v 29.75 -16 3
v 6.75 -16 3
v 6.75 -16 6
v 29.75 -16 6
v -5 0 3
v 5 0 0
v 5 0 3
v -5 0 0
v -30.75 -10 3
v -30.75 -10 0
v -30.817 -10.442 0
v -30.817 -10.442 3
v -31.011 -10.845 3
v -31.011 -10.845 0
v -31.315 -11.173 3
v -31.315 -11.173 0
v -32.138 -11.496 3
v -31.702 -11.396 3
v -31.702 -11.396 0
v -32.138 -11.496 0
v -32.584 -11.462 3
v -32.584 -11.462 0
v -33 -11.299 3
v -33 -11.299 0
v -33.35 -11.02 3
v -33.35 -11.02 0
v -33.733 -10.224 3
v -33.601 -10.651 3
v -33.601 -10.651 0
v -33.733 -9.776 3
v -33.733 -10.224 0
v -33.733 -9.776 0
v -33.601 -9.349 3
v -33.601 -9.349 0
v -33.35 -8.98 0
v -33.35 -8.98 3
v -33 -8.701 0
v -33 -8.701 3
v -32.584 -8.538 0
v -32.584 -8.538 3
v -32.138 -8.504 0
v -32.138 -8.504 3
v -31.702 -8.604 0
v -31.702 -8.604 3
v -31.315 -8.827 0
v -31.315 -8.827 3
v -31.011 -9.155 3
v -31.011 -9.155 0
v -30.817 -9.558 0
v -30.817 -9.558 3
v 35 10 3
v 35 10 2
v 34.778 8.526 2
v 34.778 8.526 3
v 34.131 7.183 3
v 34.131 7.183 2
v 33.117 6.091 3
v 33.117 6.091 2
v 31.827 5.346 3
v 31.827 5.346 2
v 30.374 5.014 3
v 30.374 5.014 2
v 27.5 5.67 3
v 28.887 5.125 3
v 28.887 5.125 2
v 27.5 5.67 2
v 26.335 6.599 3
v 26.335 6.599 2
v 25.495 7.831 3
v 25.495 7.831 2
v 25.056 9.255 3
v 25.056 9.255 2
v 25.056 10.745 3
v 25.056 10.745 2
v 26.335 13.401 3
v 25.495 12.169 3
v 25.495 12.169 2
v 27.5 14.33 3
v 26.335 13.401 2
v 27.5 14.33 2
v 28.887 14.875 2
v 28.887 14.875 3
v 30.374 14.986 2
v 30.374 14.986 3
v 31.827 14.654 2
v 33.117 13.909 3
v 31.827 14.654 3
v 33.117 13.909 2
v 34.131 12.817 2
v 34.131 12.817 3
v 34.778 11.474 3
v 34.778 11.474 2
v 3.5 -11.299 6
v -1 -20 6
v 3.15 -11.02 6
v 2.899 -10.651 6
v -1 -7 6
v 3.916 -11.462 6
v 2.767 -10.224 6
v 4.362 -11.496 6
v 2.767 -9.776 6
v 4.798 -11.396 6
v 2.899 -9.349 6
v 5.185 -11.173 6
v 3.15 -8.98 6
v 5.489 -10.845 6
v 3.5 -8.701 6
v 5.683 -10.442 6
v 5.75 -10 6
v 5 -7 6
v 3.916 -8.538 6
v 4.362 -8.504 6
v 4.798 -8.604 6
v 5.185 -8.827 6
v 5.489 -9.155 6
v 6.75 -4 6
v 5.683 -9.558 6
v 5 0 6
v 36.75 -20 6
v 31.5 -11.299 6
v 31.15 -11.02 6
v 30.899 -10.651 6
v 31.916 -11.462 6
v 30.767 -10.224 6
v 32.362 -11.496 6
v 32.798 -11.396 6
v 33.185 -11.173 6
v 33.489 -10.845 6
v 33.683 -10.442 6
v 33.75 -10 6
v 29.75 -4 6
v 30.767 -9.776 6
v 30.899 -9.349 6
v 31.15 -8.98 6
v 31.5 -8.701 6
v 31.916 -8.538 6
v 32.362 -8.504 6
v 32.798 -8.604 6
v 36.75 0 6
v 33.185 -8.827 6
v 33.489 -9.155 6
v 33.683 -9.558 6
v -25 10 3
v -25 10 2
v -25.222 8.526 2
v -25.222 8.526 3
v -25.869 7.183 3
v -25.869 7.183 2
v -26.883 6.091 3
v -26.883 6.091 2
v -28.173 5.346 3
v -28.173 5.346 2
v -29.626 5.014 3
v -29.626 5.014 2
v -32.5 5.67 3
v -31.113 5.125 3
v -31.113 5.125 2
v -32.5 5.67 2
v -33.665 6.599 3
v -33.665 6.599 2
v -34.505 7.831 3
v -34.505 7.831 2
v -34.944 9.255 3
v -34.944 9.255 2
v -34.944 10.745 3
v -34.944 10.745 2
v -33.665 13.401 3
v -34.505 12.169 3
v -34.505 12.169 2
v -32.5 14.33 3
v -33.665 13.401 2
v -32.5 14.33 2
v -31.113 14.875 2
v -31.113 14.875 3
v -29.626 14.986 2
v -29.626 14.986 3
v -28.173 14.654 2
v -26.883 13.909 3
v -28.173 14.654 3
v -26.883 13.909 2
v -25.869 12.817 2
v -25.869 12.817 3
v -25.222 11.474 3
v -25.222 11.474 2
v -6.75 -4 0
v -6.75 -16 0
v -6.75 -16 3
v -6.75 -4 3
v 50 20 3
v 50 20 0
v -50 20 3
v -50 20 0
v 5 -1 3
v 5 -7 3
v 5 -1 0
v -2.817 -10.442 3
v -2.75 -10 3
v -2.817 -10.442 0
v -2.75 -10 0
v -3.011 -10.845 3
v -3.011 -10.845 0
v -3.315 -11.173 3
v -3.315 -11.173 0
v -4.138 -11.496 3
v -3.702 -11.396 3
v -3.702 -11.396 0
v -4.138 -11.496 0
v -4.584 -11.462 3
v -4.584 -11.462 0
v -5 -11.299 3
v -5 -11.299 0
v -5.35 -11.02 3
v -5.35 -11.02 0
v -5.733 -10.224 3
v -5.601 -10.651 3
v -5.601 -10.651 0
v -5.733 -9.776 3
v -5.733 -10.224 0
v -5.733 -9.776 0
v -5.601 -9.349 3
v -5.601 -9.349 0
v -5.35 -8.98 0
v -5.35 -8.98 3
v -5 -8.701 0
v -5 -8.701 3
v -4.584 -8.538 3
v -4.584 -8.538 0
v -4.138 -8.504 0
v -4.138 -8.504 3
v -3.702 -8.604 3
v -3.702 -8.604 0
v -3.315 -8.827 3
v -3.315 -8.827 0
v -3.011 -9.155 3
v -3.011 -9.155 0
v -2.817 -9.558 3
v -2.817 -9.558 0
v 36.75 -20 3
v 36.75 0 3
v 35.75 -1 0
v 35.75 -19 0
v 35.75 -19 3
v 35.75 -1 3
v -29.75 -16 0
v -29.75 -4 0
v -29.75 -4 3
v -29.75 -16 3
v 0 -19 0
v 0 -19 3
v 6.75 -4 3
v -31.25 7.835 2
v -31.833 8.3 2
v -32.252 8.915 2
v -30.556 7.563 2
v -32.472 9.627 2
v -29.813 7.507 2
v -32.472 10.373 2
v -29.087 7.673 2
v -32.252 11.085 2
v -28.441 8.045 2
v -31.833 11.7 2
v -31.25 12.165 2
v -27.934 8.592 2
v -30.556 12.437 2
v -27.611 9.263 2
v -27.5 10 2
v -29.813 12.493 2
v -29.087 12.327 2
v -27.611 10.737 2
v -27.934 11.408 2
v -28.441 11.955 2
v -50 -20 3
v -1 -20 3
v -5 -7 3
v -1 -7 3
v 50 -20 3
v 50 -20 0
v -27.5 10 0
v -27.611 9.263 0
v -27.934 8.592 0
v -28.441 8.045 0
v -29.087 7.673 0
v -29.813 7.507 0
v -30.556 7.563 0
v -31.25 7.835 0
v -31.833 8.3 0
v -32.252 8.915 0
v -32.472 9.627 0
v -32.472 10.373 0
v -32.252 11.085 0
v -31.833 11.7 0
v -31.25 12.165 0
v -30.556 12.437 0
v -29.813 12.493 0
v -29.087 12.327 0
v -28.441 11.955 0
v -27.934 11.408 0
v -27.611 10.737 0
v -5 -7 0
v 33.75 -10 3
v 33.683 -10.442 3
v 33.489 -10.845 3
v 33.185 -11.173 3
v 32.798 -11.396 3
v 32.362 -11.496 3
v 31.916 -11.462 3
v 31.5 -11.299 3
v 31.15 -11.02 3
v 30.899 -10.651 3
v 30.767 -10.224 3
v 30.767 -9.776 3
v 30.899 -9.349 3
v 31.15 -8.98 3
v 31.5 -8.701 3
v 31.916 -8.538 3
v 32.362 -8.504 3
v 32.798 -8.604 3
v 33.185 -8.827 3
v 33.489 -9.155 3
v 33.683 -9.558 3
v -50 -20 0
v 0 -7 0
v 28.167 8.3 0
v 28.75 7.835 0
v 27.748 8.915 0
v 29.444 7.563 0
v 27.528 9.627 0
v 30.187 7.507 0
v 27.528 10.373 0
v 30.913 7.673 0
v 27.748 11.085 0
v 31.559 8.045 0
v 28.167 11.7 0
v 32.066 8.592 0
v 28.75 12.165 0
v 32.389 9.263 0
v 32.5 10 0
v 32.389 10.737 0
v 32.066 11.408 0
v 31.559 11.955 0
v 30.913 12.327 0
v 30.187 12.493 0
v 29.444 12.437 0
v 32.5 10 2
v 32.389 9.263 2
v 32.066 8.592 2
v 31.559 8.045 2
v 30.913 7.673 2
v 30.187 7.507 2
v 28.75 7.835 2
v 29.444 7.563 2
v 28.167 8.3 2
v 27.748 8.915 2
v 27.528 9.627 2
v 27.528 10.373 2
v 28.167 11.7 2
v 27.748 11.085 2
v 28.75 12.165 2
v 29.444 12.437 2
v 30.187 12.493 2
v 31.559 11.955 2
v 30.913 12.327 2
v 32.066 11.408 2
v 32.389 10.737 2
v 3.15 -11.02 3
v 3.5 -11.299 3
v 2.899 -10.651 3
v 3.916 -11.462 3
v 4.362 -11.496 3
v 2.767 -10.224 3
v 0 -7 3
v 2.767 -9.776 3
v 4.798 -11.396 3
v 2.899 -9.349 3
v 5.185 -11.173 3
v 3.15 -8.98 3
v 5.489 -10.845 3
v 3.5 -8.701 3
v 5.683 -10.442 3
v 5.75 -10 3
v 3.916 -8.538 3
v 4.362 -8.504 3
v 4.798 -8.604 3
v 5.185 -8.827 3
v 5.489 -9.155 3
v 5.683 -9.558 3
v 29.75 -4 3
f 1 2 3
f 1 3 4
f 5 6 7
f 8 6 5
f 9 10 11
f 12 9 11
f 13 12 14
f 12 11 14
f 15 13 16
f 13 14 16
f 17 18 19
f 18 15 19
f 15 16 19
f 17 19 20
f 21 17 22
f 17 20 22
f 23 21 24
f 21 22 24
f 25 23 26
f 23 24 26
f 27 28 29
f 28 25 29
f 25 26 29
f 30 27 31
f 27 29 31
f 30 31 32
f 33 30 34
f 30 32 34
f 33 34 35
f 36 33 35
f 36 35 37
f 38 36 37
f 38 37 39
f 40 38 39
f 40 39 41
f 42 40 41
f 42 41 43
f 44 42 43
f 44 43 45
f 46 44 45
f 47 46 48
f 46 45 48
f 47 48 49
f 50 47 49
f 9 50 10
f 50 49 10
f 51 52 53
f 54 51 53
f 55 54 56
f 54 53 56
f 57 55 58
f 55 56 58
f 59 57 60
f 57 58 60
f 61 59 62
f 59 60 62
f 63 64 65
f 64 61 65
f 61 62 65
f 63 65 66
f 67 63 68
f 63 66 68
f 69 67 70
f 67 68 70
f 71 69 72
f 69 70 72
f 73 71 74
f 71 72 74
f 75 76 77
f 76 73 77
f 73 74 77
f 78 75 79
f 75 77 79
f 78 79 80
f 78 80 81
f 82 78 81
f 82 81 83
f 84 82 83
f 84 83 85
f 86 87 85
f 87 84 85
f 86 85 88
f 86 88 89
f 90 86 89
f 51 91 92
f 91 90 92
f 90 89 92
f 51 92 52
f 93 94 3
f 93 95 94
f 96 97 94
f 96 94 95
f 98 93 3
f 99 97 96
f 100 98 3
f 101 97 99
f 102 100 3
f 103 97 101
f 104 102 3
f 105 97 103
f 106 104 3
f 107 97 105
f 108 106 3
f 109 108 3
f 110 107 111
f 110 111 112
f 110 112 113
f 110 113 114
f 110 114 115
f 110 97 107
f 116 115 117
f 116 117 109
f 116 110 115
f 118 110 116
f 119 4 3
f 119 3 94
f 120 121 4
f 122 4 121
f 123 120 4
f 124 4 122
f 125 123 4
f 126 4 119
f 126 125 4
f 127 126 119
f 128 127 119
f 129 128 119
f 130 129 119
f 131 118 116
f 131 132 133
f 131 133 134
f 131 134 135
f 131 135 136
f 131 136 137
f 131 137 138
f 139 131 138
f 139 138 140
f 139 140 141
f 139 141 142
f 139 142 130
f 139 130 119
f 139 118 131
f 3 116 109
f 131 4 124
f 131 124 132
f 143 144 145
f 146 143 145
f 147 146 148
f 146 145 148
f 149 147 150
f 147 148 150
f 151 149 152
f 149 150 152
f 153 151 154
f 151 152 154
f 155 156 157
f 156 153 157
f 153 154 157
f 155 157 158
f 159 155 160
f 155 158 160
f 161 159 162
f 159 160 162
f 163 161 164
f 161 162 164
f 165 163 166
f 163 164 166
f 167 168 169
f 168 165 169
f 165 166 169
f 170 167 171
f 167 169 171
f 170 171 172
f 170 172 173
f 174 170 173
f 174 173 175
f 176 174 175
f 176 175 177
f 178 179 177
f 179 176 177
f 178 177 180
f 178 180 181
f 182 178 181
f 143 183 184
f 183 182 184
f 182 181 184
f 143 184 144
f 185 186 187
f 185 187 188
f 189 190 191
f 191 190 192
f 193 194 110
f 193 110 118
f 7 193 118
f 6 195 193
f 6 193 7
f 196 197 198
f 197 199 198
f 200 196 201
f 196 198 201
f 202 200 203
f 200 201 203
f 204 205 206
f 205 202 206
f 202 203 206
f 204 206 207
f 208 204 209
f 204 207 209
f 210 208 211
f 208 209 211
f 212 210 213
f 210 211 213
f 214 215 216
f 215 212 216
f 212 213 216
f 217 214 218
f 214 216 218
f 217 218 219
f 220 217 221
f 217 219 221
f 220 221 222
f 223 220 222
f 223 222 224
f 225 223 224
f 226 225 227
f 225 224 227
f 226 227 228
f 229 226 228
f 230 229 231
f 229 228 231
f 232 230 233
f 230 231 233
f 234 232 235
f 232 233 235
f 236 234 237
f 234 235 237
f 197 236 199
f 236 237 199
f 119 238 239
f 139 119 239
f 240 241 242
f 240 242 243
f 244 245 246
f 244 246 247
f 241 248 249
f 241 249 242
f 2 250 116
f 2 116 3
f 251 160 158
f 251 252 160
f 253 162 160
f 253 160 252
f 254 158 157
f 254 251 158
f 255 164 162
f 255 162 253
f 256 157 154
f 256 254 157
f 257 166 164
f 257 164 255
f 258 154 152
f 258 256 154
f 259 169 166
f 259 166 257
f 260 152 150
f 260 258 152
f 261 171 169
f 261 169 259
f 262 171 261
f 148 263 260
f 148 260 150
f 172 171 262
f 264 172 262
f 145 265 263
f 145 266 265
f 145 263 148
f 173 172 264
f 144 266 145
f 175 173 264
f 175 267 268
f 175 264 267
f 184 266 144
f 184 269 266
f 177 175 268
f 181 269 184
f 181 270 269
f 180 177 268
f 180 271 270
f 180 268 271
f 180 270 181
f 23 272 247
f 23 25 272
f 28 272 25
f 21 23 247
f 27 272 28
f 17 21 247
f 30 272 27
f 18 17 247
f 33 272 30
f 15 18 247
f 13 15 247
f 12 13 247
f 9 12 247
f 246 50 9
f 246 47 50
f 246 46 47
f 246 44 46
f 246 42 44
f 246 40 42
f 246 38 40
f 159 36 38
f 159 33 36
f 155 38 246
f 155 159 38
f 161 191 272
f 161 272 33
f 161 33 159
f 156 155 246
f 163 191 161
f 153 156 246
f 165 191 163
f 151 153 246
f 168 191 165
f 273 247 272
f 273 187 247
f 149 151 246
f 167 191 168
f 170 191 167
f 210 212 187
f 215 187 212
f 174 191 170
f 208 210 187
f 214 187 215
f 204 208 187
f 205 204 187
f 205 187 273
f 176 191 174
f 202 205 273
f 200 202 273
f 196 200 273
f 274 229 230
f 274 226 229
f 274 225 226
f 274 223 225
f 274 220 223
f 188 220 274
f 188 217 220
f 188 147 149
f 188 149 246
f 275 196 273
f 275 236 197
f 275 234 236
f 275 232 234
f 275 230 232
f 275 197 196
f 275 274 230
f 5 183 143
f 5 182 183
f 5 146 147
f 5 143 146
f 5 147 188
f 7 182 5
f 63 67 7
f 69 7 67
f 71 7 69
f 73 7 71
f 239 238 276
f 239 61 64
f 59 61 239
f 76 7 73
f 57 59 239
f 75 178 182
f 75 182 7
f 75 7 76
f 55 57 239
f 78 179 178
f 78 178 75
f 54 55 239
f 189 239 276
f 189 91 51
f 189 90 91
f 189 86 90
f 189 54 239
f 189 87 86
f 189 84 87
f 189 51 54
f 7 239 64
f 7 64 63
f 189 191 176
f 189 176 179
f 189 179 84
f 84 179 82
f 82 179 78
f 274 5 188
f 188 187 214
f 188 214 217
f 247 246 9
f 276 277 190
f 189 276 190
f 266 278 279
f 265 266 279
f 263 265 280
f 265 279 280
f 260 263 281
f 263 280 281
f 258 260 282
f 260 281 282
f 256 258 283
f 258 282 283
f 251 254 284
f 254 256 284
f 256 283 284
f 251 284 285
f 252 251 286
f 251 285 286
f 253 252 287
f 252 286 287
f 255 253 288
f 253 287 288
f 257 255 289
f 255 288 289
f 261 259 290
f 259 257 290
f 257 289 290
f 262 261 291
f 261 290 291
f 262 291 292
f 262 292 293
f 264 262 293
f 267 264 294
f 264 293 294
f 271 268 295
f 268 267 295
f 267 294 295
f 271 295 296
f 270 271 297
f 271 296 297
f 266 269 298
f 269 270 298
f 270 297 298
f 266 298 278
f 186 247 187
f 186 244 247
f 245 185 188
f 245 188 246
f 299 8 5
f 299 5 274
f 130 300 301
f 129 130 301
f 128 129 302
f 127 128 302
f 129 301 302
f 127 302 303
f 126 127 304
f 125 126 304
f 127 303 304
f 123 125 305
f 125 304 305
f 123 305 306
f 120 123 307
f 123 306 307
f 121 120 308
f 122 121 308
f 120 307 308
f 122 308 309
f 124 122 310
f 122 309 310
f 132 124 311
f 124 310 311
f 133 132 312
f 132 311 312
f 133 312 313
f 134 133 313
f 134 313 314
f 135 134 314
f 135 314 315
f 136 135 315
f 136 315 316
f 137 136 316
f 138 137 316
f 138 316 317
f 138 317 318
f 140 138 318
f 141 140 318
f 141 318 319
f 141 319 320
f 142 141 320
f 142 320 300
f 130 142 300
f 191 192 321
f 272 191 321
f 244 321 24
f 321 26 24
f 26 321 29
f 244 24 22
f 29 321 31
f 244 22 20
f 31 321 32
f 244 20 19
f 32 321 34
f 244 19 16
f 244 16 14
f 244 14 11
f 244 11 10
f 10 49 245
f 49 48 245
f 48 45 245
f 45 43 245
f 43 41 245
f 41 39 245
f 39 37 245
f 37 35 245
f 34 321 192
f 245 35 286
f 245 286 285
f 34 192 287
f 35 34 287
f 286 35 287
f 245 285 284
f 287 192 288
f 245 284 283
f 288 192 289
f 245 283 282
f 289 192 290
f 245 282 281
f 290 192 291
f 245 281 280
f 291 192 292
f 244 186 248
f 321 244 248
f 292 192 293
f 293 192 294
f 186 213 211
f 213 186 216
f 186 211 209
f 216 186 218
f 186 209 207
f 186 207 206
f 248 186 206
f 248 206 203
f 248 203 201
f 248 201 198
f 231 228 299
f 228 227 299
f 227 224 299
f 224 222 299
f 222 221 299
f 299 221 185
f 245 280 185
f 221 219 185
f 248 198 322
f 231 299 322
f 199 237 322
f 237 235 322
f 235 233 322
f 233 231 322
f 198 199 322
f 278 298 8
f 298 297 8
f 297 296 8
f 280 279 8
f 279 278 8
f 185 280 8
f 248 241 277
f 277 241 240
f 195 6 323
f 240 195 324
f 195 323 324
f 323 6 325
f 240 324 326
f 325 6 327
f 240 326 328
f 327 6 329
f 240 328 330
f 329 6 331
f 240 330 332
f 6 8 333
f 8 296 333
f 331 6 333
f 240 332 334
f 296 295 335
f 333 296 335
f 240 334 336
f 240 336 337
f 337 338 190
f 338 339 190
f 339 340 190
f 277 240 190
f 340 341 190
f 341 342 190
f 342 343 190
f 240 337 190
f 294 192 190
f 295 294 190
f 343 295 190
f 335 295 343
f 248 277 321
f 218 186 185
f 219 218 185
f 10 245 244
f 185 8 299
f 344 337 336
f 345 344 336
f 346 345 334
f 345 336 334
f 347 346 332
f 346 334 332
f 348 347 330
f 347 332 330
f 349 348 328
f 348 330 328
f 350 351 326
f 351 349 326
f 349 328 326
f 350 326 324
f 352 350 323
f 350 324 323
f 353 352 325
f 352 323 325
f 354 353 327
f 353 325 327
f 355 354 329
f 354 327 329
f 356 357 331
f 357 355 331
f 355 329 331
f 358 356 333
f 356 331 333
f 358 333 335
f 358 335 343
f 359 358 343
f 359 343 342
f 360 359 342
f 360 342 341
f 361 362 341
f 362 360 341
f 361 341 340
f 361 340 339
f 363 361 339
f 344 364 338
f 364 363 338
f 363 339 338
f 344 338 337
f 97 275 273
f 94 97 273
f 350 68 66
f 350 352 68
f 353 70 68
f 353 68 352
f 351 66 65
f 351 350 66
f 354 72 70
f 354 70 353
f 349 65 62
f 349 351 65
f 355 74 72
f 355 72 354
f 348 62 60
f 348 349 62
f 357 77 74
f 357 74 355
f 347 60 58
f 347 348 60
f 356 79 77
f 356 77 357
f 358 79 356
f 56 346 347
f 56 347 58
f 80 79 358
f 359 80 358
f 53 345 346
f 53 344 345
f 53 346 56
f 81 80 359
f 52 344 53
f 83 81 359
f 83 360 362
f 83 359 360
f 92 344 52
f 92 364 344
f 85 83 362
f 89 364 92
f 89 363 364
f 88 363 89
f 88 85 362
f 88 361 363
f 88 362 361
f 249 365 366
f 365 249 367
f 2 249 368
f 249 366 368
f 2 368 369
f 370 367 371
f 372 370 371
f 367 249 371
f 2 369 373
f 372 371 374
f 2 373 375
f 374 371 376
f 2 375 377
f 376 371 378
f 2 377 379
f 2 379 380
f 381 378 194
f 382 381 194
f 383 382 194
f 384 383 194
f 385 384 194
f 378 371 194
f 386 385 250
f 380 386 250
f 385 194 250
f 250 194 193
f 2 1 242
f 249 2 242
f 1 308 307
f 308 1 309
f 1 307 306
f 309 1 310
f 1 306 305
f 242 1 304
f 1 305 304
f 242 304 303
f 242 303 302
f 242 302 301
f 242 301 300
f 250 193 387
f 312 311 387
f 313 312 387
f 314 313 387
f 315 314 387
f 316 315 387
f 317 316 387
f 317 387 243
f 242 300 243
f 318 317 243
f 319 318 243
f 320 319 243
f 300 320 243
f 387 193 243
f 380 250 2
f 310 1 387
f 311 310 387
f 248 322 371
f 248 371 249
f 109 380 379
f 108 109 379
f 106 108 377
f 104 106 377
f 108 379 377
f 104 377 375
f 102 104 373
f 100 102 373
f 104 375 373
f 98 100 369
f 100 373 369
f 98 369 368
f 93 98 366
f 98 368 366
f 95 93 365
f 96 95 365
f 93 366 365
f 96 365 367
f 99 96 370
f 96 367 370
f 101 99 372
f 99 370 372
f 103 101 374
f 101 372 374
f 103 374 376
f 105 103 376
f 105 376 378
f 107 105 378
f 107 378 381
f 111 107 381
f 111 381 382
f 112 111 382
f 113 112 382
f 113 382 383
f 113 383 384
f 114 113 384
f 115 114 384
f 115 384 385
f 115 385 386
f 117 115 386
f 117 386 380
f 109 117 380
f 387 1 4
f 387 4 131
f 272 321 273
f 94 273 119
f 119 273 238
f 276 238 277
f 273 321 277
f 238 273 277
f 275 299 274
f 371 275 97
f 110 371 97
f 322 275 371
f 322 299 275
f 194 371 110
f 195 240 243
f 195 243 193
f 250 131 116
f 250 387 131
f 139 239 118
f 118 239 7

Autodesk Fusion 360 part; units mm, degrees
sketch "Sketch1" plane through (0, 0, 0) normal (0, 0, 1) x (1, 0, 0)
  line L0 (50, 20) -> (-50, 20)
  line L1 (-50, 20) -> (-50, -20)
  line L2 (-50, -20) -> (50, -20)
  line L3 (50, -20) -> (50, 20)
  line L4 (50, 20) -> (-50, -20) construction
  line L5 (-50, 20) -> (50, -20) construction
  line L6 (35.75, -1) -> (-35.75, -1)
  line L7 (-35.75, -1) -> (-35.75, -19)
  line L8 (-35.75, -19) -> (35.75, -19)
  line L9 (35.75, -19) -> (35.75, -1)
  line L10 (35.75, -1) -> (-35.75, -19) construction
  line L11 (-35.75, -1) -> (35.75, -19) construction
  line L12 (-29.75, -4) -> (-29.75, -16)
  line L13 (29.75, -16) -> (29.75, -4)
  line L14 (29.75, -4) -> (-29.75, -16) construction
  line L15 (-29.75, -4) -> (29.75, -16) construction
  line L16 (-6.75, -16) -> (-6.75, -4)
  line L17 (6.75, -4) -> (6.75, -16)
  line L18 (6.75, -16) -> (-6.75, -4) construction
  line L19 (-6.75, -16) -> (6.75, -4) construction
  line L20 (29.75, -4) -> (6.75, -4)
  line L21 (-6.75, -4) -> (-29.75, -4)
  line L22 (-29.75, -16) -> (-6.75, -16)
  line L23 (6.75, -16) -> (29.75, -16)
  circle A0 centre (-32.25, -10) radius 1.5
  circle A1 centre (32.25, -10) radius 1.5
  circle A2 centre (-4.25, -10) radius 1.5
  circle A3 centre (4.25, -10) radius 1.5
  line L24 (0, -1) -> (0, -19)
  line L25 (5, 0) -> (-5, 0)
  line L26 (-5, 0) -> (-5, -7)
  line L27 (-5, -7) -> (5, -7)
  line L28 (5, -7) -> (5, 0)
  line L29 (5, 0) -> (-5, -7) construction
  line L30 (-5, 0) -> (5, -7) construction
  point P0 (0, -10)
  point P1 (0, -10)
  point P2 (0, -10)
  point P3 (-32.25, -10)
  point P4 (32.25, -10)
  point P5 (-4.25, -10)
  point P6 (4.25, -10)
  point P7 (0, -3.5)
  dimension "d1" = 100
  dimension "d2" = 40
  dimension "d3" = 71.5
  dimension "d4" = 18
  dimension "d5" = 1
  dimension "d6" = 59.5
  dimension "d7" = 12
  dimension "d8" = 13.5
  dimension "d9" = 12
  dimension "d10" = 3.5
  dimension "d11" = 3
  dimension "d12" = 3.5
  dimension "d13" = 3
  dimension "d14" = 2.5
  dimension "d15" = 2.5
  dimension "d16" = 3
  dimension "d17" = 3
  dimension "d44" = 10
  dimension "d45" = 7
extrude "Extrude1" add sketch "Sketch1" along normal blind 3 contours L0 L1 L2 L3 | L6 L25 L26 L28 | L6 L24 L26 L27 | L6 L7 L8 L24 L26 L27 makes body 1
extrude "Extrude2" add sketch "Sketch1" along normal blind 6 and the other way blind -3 separate body contours L6 L8 L9 L24 L27 L28 | L6 L24 L27 L28 makes body 2
move_face "OffsetFaces1" offset 1 3 faces at (0, -7, 5) (23.8333, -1, 4) (35.75, -13, 5) on bodies 2
move_face "OffsetFaces2" offset 1 1 faces at (11.5833, -19, 5) on bodies 2
sketch "Sketch2" plane through (0, 0, 0) normal (0, 0, 1) x (1, 0, 0)
  line L0 (-50, 20) -> (-50, -20)
  line L1 (50, 20) -> (-50, 20)
  line L2 (50, -20) -> (50, 20)
  circle A0 centre (-30, 10) radius 2.5
  circle A1 centre (30, 10) radius 2.5
  circle A2 centre (-30, 10) radius 5
  circle A3 centre (30, 10) radius 5
  circle A4 centre (0, 10) radius 5
  circle A5 centre (0, 10) radius 2.5
  point P0 (-30, 10)
  point P1 (30, 10)
  dimension "d31" = 20
  dimension "d32" = 10
  dimension "d33" = 20
  dimension "d34" = 5
  dimension "d35" = 5
  dimension "d36" = 10
  dimension "d37" = 10
  dimension "d48" = 10
  dimension "d49" = 5
extrude "Extrude3" cut sketch "Sketch2" along normal blind 3 contours A0 | A1 bodies 1
extrude "Extrude4" cut sketch "Sketch2" along normal blind 3 and the other way blind -2 contours A2 | A3 bodies 1
combine "Combine1" operation add target body 2 tool bodies 1
extrude "Extrude5" cut sketch "Sketch1" along normal blind 6 contours L6 L24 L27 L28 | L6 L25 L26 L28 | L6 L24 L26 L27 bodies 2
